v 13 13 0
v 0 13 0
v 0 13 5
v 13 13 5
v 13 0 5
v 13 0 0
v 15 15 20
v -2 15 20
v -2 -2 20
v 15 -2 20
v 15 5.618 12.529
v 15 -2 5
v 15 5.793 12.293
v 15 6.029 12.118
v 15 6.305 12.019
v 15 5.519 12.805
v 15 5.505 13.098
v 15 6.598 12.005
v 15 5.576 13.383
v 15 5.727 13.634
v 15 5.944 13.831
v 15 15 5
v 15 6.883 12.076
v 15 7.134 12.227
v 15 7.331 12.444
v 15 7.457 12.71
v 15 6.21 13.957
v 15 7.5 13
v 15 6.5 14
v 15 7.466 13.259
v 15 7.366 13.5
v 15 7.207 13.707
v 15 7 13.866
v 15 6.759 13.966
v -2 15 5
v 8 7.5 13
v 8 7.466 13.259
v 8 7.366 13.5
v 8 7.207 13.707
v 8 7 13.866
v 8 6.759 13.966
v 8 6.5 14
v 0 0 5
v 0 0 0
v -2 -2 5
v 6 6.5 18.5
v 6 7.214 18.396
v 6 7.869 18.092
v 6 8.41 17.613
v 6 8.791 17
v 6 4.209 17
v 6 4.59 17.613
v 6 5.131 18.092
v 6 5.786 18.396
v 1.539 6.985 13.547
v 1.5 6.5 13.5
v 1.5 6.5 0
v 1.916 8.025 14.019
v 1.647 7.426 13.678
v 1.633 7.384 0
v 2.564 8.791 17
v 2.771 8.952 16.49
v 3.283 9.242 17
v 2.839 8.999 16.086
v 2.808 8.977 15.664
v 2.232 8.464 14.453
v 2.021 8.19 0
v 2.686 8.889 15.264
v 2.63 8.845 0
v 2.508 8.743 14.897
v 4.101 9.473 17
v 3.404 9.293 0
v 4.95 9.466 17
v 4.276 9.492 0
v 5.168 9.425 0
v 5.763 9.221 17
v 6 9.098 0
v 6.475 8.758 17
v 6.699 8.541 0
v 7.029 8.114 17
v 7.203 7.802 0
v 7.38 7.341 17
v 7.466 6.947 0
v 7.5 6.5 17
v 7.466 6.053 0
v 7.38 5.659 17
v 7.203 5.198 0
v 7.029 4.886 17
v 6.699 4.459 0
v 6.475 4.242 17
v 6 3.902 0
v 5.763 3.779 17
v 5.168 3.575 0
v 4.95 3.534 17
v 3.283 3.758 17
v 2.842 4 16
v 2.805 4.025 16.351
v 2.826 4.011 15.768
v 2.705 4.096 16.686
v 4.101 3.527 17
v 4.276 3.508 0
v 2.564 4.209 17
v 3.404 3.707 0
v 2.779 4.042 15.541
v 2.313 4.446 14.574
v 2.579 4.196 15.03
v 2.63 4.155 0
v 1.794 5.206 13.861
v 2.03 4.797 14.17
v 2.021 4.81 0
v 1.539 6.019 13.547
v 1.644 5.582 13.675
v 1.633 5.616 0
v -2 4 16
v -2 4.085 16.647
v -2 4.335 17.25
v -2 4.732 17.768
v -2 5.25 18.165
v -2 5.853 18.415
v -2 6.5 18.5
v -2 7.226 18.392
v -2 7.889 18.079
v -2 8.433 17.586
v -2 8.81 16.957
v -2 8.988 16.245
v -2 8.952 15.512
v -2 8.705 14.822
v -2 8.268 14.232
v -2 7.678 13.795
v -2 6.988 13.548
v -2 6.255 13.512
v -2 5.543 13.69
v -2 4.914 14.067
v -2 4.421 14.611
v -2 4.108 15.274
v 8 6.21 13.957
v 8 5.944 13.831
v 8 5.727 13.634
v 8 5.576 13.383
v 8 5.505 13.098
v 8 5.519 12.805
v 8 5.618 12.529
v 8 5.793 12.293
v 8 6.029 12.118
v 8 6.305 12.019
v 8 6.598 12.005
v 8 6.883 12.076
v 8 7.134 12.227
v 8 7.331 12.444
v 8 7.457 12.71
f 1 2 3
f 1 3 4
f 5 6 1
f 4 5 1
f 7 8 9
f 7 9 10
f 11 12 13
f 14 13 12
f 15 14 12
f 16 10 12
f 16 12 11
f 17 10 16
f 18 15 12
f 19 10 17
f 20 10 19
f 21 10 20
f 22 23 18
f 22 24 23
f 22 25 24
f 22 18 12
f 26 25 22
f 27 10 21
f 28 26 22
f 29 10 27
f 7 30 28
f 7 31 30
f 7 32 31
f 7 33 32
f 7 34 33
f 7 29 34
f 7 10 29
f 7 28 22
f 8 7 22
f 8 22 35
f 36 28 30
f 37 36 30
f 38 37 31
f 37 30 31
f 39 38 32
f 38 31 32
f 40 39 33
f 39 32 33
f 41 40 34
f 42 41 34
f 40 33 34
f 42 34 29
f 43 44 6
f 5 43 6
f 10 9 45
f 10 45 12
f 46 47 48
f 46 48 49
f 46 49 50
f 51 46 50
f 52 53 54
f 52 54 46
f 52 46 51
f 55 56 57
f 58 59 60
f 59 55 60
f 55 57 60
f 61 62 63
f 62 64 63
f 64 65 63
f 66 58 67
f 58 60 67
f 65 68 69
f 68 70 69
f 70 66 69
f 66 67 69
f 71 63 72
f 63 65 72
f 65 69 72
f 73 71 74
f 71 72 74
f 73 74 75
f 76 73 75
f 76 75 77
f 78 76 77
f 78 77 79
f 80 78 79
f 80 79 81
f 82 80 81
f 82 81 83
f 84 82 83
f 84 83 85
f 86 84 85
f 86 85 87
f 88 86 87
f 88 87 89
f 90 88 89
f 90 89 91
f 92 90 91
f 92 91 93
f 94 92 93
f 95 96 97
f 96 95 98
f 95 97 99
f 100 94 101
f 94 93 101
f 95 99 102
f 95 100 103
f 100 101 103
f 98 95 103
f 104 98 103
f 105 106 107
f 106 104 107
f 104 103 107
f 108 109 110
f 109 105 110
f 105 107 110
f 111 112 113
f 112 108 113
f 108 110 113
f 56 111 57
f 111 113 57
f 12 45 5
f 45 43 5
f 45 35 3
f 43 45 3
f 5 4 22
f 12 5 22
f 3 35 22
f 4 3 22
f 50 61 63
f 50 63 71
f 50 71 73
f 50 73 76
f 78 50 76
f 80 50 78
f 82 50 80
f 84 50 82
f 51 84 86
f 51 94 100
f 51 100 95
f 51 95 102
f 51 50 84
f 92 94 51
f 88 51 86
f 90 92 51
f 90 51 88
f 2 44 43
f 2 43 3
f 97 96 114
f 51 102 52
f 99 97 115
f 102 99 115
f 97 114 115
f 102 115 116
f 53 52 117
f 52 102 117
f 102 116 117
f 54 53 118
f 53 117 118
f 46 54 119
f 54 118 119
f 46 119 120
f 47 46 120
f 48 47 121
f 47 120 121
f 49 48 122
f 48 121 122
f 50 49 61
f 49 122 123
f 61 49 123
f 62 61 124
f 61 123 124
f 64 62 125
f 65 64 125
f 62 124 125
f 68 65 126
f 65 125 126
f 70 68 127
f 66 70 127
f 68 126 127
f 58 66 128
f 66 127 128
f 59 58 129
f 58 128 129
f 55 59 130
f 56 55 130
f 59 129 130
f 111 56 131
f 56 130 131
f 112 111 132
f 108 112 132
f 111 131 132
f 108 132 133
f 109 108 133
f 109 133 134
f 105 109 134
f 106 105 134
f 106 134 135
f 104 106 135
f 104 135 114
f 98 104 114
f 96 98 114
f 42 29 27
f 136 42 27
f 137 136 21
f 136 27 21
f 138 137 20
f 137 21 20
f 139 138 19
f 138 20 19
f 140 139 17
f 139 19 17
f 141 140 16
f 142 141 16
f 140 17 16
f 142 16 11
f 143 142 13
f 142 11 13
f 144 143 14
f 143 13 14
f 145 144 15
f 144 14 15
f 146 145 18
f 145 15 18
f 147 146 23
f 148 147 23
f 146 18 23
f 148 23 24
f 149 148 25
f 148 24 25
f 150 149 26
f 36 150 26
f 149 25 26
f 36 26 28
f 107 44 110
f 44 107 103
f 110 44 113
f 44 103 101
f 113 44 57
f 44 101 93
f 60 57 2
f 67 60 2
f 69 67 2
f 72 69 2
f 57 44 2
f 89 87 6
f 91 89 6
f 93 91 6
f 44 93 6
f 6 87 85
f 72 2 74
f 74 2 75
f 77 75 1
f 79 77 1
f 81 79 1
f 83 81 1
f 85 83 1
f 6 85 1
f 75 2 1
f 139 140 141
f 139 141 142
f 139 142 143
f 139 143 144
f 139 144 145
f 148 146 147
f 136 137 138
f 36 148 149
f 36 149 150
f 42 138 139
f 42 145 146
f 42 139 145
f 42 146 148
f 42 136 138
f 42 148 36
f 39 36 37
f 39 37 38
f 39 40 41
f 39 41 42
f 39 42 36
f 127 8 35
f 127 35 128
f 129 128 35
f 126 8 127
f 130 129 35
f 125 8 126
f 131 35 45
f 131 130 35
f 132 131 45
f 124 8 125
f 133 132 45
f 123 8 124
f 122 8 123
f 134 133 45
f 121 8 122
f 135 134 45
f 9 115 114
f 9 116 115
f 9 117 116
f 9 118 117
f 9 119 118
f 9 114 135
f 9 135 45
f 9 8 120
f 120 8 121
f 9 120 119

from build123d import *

# Parameters (mm, degrees)
F0_W     = 13
F0_H     = 13
F1_DEPTH = 20
F2_W     = 13
F2_H     = 13
F3_DEPTH = 15
F5_DEPTH = 7
F7_DEPTH = 8
F9_DEPTH = 17


with BuildPart() as f1:
    # F0 (on Top) → F1 (new body)
    with BuildSketch(Plane.XY):
        with Locations((6.5, 6.5)):
            Rectangle(F0_W, F0_H)
    extrude(amount=F1_DEPTH)

    # F2 (on face) → F3 (join)
    with BuildSketch(Plane.XY.offset(20)):
        Polygon((-2, 15), (-2, 0), (-2, -2), (15, -2), (15, 15), align=None)
        with Locations((6.5, 6.5)):
            Rectangle(F2_W, F2_H, mode=Mode.SUBTRACT)
    extrude(amount=-F3_DEPTH)

    # F4 (on face) → F5 (cut)
    with BuildSketch(Plane.YZ.offset(15)):
        with BuildLine():
            ThreePointArc((7.5, 13), (7.207107, 13.707107), (6.5, 14))
            ThreePointArc((6.5, 14), (5.792893, 12.292893), (7.5, 13))
        make_face()
    extrude(amount=-F5_DEPTH, mode=Mode.SUBTRACT)

    # F6 (on face) → F7 (cut)
    with BuildSketch(Plane(origin=(-2, 0, 0), x_dir=(0, -1, 0), z_dir=(-1, 0, 0))):
        with BuildLine():
            ThreePointArc((-4, 16), (-4.732233, 17.767767), (-6.5, 18.5))
            ThreePointArc((-6.5, 18.5), (-8.267767, 14.232233), (-4, 16))
        make_face()
    extrude(amount=-F7_DEPTH, mode=Mode.SUBTRACT)

    # F8 (on face) → F9 (cut)
    with BuildSketch(Plane(origin=(0, 0, 0), x_dir=(1, 0, 0), z_dir=(0, 0, -1))):
        with BuildLine():
            ThreePointArc((7.5, -6.5), (4.5, -3.5), (1.5, -6.5))
            ThreePointArc((1.5, -6.5), (4.5, -9.5), (7.5, -6.5))
        make_face()
    extrude(amount=-F9_DEPTH, mode=Mode.SUBTRACT)


solid = f1.part
